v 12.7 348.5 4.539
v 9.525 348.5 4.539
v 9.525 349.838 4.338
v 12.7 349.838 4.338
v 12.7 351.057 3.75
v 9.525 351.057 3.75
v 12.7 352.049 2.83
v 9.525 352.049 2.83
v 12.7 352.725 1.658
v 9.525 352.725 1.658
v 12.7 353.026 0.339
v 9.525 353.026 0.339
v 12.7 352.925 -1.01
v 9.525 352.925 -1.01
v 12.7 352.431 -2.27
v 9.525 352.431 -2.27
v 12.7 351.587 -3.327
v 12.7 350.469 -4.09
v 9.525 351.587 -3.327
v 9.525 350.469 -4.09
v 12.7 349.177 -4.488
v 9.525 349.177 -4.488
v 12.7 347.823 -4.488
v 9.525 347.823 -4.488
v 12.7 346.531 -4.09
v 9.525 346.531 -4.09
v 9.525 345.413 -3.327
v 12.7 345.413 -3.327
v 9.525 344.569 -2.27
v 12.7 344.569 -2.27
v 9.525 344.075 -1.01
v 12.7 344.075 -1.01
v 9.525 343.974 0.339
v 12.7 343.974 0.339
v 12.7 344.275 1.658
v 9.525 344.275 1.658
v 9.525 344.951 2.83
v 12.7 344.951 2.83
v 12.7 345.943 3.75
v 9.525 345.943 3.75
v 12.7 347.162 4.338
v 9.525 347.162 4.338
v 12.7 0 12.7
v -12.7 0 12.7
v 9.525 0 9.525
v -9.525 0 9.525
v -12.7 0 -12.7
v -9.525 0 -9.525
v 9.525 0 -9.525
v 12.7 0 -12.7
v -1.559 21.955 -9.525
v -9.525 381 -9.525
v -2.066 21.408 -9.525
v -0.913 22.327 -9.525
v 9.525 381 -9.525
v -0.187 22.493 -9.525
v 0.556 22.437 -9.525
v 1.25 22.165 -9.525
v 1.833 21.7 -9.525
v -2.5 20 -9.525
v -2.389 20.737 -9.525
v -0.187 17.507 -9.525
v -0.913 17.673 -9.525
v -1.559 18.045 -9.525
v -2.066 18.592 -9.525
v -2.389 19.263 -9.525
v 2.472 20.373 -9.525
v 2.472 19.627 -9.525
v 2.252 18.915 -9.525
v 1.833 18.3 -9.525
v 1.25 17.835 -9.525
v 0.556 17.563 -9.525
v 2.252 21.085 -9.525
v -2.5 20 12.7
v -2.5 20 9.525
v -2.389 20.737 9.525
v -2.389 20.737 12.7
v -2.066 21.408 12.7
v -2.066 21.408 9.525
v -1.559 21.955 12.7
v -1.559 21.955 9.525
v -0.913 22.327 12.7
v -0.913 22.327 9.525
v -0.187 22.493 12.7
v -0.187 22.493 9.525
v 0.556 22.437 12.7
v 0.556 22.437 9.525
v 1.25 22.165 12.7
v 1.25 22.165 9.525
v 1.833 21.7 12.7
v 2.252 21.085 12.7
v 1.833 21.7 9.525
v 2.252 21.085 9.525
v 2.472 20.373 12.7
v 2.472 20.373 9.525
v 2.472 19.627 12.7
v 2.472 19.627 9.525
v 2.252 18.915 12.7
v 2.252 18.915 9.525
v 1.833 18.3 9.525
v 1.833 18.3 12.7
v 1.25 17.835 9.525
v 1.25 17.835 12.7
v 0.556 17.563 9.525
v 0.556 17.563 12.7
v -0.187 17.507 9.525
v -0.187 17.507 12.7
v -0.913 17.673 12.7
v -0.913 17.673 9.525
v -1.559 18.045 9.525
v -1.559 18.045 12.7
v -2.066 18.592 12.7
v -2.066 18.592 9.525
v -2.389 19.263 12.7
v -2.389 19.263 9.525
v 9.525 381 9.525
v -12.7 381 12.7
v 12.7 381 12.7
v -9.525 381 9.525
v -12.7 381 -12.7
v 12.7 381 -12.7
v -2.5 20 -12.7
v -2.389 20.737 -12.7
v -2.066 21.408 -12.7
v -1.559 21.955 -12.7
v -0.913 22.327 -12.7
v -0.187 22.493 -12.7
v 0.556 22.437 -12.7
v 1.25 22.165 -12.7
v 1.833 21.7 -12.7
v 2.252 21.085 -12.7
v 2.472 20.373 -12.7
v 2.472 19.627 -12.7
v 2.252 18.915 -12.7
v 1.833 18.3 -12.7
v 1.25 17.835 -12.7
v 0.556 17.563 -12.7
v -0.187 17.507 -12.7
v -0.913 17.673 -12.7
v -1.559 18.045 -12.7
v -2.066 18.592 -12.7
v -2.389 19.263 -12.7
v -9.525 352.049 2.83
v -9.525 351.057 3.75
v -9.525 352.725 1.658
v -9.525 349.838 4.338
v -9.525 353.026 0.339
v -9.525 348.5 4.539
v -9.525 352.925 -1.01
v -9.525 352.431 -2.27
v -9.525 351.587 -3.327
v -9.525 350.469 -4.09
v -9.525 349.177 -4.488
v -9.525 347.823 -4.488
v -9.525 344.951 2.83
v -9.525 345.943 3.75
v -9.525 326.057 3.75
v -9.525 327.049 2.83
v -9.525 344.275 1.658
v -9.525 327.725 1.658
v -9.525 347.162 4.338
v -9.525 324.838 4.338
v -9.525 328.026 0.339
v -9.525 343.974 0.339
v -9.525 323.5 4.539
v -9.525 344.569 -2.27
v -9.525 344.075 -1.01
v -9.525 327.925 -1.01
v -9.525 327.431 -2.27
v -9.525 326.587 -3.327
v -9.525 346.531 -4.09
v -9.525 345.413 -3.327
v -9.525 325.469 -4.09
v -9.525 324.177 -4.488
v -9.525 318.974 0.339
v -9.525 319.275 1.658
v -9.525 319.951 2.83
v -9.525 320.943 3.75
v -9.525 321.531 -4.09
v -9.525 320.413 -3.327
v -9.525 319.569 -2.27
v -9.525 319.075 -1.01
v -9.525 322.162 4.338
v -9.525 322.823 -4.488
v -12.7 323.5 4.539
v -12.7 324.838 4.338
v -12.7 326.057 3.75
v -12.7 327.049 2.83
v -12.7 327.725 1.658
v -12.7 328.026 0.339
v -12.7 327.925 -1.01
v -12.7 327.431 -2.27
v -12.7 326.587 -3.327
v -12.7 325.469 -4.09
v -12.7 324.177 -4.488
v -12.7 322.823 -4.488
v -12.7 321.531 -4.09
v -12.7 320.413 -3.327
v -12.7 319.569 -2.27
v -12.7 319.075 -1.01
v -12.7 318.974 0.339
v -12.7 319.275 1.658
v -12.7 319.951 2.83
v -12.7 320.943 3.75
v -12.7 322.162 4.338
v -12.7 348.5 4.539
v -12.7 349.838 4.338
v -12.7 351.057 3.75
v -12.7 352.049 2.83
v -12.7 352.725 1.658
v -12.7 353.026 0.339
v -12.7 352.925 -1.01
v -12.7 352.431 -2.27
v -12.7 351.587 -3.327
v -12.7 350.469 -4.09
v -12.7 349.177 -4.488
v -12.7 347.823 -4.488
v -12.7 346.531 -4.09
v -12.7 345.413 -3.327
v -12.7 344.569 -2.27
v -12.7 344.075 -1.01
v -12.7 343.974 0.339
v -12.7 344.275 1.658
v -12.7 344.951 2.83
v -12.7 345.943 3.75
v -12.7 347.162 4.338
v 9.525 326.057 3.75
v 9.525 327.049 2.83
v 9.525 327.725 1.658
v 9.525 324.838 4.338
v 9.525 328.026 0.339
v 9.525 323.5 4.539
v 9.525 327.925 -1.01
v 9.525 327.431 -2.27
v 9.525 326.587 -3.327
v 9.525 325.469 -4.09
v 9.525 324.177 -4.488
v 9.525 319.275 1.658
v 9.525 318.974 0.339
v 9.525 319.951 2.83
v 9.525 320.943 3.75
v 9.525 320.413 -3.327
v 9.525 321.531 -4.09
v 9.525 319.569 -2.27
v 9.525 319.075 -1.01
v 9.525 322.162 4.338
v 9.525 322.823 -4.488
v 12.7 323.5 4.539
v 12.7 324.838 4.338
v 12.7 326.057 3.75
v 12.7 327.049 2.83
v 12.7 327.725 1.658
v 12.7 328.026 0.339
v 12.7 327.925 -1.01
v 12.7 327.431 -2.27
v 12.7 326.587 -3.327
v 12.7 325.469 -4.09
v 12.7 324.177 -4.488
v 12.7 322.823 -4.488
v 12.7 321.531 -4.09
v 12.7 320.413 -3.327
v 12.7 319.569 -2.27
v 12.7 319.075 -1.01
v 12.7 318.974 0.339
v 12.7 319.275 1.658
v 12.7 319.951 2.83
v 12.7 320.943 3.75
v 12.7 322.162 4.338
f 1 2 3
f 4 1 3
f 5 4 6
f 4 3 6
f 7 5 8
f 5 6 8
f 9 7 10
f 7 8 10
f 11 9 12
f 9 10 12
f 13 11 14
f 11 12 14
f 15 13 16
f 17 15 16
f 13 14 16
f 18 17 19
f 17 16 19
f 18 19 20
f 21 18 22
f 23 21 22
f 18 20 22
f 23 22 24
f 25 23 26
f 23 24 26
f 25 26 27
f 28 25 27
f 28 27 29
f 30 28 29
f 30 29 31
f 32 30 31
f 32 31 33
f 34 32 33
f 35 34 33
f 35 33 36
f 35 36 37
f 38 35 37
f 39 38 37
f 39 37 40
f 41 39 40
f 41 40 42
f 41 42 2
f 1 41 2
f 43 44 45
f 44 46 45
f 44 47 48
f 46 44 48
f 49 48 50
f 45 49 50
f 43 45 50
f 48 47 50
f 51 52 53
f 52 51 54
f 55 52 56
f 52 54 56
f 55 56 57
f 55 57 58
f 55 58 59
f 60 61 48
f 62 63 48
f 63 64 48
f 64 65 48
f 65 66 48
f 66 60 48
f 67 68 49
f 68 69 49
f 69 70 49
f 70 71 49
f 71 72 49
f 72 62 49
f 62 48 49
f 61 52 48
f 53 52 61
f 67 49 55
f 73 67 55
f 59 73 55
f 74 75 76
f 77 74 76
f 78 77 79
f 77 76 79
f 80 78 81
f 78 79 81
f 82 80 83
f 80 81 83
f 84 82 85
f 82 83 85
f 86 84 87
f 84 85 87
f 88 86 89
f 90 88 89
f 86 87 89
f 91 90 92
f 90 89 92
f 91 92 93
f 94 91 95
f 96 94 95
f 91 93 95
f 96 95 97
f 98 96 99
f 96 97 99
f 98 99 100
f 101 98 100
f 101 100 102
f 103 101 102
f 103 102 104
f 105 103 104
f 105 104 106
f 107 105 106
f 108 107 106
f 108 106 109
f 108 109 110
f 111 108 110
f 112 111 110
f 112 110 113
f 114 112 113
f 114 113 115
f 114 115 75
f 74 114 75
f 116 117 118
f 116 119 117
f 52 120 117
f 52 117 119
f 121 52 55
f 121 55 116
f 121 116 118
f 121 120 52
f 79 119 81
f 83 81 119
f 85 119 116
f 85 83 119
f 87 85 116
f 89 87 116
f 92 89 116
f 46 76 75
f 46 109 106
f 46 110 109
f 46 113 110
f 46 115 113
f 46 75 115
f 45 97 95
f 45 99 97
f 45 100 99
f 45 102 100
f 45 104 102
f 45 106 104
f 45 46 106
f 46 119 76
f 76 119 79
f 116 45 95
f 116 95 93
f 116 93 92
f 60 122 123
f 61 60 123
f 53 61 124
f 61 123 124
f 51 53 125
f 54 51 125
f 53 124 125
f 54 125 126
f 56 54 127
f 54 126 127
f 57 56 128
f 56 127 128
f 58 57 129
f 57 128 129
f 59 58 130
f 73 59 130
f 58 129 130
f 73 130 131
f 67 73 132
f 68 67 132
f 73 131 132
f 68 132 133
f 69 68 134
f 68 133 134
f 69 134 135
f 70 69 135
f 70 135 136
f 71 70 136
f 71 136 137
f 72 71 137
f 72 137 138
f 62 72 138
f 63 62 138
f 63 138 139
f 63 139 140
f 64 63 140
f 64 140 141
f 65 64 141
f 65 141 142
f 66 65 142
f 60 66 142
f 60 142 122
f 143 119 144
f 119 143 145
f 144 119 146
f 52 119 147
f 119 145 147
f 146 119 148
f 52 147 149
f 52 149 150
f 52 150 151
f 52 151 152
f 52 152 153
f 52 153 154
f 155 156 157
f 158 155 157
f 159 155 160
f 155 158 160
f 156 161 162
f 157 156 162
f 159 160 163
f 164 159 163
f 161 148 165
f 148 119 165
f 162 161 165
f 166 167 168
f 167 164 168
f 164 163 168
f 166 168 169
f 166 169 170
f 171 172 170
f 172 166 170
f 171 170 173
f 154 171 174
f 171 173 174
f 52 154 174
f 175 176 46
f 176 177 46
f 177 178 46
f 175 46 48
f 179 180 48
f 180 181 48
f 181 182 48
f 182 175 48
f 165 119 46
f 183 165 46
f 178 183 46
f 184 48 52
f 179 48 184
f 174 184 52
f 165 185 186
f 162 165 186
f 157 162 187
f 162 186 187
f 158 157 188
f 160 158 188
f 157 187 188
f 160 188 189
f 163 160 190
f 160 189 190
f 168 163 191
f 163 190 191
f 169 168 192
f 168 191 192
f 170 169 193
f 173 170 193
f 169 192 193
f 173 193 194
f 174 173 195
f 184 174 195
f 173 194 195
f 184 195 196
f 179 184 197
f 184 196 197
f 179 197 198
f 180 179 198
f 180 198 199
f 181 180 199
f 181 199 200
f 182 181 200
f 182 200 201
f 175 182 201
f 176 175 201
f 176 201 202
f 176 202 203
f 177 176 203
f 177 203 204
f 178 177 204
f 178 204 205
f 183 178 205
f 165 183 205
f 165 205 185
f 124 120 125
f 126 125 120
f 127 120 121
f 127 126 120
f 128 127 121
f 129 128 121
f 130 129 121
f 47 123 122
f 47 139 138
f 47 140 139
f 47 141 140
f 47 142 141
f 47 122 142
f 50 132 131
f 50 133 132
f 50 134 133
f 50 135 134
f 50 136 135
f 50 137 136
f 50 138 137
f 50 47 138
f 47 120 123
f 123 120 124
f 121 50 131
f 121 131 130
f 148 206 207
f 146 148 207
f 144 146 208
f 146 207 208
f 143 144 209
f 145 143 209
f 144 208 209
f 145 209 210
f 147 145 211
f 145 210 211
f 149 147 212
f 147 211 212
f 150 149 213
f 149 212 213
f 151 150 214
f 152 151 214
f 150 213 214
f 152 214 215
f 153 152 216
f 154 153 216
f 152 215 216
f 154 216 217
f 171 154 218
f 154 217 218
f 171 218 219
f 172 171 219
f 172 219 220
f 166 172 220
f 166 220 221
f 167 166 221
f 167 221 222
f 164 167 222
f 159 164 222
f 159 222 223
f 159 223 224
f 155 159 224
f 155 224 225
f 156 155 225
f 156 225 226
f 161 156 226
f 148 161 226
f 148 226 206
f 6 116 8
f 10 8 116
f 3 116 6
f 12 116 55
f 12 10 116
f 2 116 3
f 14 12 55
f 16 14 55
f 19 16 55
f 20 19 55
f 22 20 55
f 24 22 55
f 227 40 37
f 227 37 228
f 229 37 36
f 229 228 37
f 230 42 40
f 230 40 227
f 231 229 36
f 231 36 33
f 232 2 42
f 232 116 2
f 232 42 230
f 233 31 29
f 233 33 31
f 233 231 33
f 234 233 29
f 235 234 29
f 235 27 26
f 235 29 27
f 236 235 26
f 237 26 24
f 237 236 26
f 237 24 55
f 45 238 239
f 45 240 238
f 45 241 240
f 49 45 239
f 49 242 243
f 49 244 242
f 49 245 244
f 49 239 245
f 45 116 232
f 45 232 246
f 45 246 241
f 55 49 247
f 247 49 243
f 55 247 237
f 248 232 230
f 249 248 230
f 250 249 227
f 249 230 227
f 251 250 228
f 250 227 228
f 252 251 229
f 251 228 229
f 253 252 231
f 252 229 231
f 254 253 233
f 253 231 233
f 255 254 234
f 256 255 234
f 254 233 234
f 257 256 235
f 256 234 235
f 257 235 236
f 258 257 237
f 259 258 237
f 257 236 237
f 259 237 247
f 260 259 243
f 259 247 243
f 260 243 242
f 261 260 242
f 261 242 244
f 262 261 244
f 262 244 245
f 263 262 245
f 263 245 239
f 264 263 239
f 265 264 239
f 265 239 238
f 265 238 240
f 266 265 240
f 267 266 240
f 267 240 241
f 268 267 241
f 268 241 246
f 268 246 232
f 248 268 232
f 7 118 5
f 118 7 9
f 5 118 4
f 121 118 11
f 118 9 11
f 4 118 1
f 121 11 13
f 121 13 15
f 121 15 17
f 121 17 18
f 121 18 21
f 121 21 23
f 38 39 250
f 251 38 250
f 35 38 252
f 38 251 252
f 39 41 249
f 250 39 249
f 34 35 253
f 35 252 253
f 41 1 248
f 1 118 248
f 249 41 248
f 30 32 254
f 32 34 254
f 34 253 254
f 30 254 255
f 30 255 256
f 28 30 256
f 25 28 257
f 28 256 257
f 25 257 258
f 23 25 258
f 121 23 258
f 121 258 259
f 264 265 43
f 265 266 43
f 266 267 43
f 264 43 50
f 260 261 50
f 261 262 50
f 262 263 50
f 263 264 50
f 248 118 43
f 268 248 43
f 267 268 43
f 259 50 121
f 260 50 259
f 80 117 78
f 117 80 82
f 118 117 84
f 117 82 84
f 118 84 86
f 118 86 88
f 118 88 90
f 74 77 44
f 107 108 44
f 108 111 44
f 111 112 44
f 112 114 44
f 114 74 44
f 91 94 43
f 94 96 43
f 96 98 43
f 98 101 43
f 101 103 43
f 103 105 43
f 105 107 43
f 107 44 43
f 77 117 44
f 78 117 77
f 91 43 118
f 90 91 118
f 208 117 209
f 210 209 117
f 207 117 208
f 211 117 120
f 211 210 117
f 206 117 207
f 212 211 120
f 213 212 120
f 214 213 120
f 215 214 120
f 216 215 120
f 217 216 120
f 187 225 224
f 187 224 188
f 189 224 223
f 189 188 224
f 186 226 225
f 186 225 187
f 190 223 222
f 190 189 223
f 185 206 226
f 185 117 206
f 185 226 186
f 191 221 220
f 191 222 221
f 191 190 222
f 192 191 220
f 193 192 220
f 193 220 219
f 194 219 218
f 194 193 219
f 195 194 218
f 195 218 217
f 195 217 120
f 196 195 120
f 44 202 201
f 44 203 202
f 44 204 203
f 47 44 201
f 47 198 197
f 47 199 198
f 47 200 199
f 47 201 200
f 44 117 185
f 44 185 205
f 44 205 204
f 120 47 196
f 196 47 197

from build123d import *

# Parameters (mm, degrees)
SKETCH1_W           = 25.4
SKETCH1_H           = 25.4
SKETCH1_W_2         = 19.05
SKETCH1_H_2         = 19.05
BOSS_EXTRUDE1_DEPTH = 381
SKETCH2_R           = 2.5
CUT_EXTRUDE1_DEPTH  = 26.4
SKETCH3_R           = 4.539166488
CUT_EXTRUDE2_DEPTH  = 26.4


with BuildPart() as part:
    # Sketch1 → Boss-Extrude1 (new body)
    with BuildSketch(Plane(origin=(0, 0, 0), x_dir=(1, 0, 0), z_dir=(0, 1, 0))):
        Rectangle(SKETCH1_W, SKETCH1_H)
        Rectangle(SKETCH1_W_2, SKETCH1_H_2, mode=Mode.SUBTRACT)
    extrude(amount=BOSS_EXTRUDE1_DEPTH)

    # Sketch2 → Cut-Extrude1 (cut, through all)
    with BuildSketch(Plane(origin=(0, 0, -12.7), x_dir=(-1, 0, 0), z_dir=(0, 0, -1))):
        with Locations((0, 20)):
            Circle(SKETCH2_R)
    extrude(amount=-CUT_EXTRUDE1_DEPTH, mode=Mode.SUBTRACT)

    # Sketch3 → Cut-Extrude2 (cut, through all)
    with BuildSketch(Plane.ZY.offset(12.7)):
        with Locations((0, 348.5)):
            Circle(SKETCH3_R)
        with Locations((0, 323.5)):
            Circle(SKETCH3_R)
    extrude(amount=-CUT_EXTRUDE2_DEPTH, mode=Mode.SUBTRACT)


solid = part.part
